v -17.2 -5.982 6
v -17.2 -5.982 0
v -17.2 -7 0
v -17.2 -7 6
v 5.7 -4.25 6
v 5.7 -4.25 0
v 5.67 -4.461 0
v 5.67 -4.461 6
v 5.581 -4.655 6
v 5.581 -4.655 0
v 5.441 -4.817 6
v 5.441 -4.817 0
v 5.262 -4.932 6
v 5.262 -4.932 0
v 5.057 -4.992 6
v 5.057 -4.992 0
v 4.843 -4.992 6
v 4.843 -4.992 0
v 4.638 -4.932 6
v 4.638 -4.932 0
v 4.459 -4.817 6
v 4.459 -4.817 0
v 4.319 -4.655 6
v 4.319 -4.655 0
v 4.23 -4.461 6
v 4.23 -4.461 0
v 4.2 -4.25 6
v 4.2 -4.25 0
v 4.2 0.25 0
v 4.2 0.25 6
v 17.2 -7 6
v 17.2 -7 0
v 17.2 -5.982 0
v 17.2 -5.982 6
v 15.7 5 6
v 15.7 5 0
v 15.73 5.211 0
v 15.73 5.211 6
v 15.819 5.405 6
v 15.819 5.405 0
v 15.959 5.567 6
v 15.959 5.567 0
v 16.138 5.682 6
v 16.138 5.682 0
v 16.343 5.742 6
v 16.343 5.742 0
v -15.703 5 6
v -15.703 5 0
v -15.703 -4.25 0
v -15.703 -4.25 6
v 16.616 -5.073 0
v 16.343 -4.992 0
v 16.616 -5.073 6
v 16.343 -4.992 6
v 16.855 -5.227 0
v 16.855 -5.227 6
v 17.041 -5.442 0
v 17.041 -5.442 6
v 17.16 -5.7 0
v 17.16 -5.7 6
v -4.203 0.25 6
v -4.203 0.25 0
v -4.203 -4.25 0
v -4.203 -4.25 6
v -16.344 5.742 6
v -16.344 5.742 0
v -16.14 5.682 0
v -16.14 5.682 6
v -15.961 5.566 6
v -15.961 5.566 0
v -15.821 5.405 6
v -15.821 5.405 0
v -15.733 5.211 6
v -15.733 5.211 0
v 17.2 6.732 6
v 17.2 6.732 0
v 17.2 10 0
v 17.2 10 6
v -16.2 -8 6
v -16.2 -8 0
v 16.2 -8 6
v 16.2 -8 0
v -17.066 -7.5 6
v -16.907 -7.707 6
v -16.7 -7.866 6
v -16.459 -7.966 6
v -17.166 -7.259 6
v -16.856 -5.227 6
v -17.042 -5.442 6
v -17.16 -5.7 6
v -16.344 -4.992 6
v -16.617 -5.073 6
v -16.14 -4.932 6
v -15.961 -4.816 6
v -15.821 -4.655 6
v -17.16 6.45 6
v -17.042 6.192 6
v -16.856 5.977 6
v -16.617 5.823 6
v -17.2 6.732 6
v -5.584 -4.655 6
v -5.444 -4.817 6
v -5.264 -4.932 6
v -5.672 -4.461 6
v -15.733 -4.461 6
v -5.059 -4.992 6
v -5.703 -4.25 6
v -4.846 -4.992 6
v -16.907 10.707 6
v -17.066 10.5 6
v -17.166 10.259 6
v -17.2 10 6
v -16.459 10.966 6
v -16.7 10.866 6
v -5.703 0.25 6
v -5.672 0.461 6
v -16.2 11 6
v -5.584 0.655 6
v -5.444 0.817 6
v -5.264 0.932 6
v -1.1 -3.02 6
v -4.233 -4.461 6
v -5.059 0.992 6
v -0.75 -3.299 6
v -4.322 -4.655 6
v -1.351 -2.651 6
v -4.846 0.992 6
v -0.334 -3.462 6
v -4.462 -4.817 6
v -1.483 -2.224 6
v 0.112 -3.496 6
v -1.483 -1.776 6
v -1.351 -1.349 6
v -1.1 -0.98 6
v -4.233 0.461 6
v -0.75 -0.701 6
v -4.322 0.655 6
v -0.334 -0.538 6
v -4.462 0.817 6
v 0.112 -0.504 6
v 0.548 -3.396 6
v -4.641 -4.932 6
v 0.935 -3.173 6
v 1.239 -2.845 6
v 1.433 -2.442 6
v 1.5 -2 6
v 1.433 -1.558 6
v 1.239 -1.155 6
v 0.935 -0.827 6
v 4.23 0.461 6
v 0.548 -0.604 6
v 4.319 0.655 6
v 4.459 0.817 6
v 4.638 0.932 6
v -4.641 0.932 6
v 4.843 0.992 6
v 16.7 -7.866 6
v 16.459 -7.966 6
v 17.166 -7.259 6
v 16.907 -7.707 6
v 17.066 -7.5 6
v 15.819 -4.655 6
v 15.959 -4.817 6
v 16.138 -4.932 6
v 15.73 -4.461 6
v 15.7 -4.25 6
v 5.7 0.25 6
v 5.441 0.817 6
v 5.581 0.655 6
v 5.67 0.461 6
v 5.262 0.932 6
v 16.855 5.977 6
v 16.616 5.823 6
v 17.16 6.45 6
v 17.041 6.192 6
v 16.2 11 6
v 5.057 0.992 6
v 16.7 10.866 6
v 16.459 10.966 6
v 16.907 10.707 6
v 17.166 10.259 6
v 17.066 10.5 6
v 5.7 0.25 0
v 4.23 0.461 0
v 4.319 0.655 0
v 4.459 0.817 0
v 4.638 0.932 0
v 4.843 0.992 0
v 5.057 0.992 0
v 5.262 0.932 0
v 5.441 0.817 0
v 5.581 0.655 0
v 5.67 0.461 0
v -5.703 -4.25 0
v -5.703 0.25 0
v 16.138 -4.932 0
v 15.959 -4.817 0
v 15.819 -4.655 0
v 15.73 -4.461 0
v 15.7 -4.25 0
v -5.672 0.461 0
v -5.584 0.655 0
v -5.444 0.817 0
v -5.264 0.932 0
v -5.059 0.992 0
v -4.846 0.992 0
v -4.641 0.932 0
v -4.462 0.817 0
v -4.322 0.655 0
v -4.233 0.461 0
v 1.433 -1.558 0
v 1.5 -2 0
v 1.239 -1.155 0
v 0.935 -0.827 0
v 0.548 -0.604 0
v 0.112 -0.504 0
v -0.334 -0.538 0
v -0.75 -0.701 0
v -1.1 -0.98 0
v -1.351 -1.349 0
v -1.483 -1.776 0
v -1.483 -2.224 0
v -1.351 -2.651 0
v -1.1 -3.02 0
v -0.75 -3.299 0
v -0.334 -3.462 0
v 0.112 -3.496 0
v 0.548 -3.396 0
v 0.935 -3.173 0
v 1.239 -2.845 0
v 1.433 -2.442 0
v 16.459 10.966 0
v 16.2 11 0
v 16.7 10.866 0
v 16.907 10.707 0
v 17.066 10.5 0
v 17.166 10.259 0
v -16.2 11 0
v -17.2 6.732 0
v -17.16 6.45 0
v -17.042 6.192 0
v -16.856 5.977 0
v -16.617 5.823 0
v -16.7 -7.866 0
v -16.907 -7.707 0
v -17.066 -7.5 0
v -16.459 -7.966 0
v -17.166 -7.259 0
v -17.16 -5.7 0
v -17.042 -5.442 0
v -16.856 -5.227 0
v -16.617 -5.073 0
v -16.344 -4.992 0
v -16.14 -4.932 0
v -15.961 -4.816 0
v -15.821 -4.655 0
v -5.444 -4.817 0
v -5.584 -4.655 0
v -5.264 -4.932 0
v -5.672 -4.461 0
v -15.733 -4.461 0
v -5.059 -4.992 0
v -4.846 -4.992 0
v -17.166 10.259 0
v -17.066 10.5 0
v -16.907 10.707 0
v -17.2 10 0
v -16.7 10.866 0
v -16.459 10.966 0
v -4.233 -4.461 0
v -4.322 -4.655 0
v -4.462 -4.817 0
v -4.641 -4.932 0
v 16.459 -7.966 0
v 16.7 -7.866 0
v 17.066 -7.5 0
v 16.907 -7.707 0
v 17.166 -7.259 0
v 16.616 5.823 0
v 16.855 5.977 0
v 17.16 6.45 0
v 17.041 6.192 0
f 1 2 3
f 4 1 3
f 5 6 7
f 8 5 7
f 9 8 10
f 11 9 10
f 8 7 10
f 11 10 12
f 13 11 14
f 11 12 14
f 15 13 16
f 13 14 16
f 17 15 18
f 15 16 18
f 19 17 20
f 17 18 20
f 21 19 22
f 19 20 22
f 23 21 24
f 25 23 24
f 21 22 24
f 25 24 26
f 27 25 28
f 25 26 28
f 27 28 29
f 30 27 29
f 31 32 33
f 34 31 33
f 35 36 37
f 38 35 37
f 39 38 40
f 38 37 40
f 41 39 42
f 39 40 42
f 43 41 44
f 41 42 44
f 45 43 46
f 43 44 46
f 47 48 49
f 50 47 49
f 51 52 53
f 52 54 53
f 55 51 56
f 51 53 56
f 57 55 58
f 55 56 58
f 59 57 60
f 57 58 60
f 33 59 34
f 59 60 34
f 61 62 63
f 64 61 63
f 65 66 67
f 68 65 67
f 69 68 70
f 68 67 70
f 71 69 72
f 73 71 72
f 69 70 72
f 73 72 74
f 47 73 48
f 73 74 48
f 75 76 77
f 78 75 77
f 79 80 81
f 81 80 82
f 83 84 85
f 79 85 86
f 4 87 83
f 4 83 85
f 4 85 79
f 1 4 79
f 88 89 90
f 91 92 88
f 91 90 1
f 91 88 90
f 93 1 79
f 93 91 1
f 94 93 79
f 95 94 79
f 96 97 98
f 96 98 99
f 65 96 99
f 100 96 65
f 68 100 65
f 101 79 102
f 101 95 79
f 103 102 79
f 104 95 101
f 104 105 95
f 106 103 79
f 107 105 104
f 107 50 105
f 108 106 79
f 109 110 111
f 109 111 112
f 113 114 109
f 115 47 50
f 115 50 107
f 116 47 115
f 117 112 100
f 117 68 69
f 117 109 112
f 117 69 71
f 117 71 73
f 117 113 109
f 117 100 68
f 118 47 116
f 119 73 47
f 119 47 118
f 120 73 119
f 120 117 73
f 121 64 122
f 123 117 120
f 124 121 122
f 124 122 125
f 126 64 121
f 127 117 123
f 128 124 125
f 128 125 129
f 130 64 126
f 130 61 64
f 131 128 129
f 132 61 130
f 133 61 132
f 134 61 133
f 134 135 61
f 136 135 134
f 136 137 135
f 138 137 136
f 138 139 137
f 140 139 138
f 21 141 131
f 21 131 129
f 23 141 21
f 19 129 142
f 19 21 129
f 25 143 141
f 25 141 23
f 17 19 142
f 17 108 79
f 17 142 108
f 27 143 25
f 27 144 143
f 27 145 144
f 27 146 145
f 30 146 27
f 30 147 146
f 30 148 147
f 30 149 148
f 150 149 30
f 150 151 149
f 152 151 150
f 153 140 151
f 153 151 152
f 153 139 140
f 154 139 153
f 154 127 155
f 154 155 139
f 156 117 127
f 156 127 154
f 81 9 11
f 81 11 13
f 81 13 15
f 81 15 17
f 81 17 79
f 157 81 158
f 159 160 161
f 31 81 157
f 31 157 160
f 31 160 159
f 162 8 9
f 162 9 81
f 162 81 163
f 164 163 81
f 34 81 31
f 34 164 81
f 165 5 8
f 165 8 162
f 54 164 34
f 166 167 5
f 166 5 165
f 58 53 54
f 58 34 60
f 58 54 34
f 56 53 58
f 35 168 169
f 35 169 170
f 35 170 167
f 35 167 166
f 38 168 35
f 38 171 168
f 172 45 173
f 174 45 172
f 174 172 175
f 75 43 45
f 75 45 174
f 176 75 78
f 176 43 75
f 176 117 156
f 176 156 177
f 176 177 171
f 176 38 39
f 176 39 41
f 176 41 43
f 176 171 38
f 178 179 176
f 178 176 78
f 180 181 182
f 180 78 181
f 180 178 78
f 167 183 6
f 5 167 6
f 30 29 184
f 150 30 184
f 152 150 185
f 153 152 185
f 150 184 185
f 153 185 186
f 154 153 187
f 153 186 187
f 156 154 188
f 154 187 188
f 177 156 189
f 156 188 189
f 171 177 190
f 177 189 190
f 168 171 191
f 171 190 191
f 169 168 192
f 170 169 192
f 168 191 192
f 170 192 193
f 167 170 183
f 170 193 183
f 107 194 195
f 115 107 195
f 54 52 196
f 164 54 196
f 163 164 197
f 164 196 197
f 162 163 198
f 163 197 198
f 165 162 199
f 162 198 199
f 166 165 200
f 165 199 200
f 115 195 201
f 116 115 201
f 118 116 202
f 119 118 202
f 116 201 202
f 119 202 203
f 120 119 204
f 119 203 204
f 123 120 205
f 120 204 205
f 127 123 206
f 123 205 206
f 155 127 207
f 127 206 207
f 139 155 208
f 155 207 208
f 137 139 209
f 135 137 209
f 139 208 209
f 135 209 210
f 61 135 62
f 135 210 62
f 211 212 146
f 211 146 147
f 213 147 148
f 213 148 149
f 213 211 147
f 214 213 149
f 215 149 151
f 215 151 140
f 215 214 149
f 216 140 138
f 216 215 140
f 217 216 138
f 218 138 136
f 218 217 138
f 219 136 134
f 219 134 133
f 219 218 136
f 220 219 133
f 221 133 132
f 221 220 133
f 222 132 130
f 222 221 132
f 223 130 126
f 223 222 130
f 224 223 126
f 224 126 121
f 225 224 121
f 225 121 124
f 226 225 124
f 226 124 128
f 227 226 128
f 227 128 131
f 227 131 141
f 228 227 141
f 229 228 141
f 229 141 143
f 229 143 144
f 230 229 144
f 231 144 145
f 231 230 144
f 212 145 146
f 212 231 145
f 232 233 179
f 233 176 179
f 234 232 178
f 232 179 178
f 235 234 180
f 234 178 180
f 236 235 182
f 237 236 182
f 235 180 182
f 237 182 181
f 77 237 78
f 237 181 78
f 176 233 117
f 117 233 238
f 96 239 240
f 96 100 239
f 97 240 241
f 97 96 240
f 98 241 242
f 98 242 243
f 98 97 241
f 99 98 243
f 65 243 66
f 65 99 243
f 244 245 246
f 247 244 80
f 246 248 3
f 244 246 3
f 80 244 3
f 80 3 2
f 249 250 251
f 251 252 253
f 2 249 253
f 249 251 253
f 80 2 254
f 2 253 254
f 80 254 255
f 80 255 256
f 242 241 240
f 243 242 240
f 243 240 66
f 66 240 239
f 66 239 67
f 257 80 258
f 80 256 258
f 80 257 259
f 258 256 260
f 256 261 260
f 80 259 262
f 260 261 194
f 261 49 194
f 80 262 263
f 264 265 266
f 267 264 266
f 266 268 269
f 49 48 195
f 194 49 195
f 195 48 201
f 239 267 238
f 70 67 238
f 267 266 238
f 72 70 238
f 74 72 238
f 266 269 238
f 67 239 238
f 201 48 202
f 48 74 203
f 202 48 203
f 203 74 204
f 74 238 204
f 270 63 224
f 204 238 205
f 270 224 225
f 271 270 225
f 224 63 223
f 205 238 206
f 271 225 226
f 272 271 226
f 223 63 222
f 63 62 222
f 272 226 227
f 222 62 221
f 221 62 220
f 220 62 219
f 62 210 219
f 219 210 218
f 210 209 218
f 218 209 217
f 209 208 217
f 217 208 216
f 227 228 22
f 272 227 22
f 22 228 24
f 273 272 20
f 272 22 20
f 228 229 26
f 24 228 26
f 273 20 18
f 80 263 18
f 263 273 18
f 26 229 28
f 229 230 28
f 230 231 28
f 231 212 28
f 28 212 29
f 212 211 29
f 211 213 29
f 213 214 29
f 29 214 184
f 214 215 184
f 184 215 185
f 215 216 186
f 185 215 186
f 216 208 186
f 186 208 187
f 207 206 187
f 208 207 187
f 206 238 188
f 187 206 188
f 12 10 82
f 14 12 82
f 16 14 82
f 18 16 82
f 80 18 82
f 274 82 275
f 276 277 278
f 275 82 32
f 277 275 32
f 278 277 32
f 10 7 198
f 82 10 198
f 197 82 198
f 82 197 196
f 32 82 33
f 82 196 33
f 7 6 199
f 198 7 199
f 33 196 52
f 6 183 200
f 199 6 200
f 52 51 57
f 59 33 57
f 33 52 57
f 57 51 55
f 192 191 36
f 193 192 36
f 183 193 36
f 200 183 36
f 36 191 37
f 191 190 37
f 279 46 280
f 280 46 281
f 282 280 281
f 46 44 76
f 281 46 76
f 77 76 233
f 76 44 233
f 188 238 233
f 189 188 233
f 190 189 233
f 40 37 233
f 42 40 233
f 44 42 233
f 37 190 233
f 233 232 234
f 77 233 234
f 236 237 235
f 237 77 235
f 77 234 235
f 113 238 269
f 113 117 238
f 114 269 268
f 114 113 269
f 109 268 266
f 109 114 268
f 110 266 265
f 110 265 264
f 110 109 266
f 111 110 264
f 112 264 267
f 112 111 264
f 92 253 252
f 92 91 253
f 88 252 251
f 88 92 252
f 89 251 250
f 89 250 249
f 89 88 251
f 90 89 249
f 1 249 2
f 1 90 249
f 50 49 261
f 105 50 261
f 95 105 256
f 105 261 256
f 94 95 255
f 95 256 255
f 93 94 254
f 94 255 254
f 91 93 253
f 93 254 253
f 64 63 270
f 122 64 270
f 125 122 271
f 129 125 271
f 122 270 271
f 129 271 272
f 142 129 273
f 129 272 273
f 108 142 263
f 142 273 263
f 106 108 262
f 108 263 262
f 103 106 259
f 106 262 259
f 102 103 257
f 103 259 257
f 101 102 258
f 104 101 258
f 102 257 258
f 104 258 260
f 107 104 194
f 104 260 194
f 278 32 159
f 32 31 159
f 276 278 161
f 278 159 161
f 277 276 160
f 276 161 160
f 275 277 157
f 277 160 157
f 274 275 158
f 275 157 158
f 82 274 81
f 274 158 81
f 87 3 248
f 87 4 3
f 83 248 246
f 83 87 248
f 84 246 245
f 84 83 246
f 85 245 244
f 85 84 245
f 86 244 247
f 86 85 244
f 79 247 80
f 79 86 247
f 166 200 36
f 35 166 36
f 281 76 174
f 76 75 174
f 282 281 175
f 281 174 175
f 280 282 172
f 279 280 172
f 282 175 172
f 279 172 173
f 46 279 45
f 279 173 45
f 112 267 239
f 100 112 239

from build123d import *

# Parameters (mm, degrees)
F0_R     = 1.5
F1_DEPTH = 6
F2_R     = 1
F3_R     = 1


with BuildPart() as f1:
    # F0 (on Top) → F1 (new body)
    with BuildSketch(Plane.XY):
        with BuildLine():
            Line((17.2, 11), (-17.2, 11))
            Line((-17.2, 11), (-17.2, 5.0637826232))
            ThreePointArc((-17.2, 5.0637826232), (-16.4207968358, 5.7493204245), (-15.7027170703, 5))
            Line((-15.7027170703, 5), (-15.7027170703, -4.25))
            ThreePointArc((-15.7027170703, -4.25), (-16.4207968358, -4.9993204245), (-17.2, -4.3137826232))
            Line((-17.2, -4.3137826232), (-17.2, -8))
            Line((-17.2, -8), (17.2, -8))
            Line((17.2, -8), (17.2, -4.25))
            ThreePointArc((17.2, -4.25), (16.45, -5), (15.7, -4.25))
            Line((15.7, -4.25), (15.7, 5))
            ThreePointArc((15.7, 5), (16.45, 5.75), (17.2, 5))
            Line((17.2, 5), (17.2, 11))
        make_face()
        with BuildLine():
            Line((-5.7027170703, -4.25), (-5.7027170703, 0.25))
            ThreePointArc((-5.7027170703, 0.25), (-4.9527170703, 1), (-4.2027170703, 0.25))
            Line((-4.2027170703, 0.25), (-4.2027170703, -4.25))
            ThreePointArc((-4.2027170703, -4.25), (-4.9527170703, -5), (-5.7027170703, -4.25))
        make_face(mode=Mode.SUBTRACT)
        with Locations((0, -2)):
            Circle(F0_R, mode=Mode.SUBTRACT)
        with BuildLine():
            Line((4.2, -4.25), (4.2, 0.25))
            ThreePointArc((4.2, 0.25), (4.95, 1), (5.7, 0.25))
            Line((5.7, 0.25), (5.7, -4.25))
            ThreePointArc((5.7, -4.25), (4.95, -5), (4.2, -4.25))
        make_face(mode=Mode.SUBTRACT)
    extrude(amount=F1_DEPTH)

    # F2
    f2_edges = [f1.edges().sort_by_distance(p)[0] for p in [
        (17.2, 11, 3),
        (17.2, -8, 3),
        (-17.2, -8, 3),
        (-17.2, 11, 3),
    ]]
    fillet(f2_edges, radius=F2_R)

    # F3
    f3_edges = [f1.edges().sort_by_distance(p)[0] for p in [
        (17.2, 5, 3),
        (17.2, -4.25, 3),
        (-17.2, 5.063783, 3),
        (-17.2, -4.313783, 3),
    ]]
    fillet(f3_edges, radius=F3_R)


solid = f1.part
